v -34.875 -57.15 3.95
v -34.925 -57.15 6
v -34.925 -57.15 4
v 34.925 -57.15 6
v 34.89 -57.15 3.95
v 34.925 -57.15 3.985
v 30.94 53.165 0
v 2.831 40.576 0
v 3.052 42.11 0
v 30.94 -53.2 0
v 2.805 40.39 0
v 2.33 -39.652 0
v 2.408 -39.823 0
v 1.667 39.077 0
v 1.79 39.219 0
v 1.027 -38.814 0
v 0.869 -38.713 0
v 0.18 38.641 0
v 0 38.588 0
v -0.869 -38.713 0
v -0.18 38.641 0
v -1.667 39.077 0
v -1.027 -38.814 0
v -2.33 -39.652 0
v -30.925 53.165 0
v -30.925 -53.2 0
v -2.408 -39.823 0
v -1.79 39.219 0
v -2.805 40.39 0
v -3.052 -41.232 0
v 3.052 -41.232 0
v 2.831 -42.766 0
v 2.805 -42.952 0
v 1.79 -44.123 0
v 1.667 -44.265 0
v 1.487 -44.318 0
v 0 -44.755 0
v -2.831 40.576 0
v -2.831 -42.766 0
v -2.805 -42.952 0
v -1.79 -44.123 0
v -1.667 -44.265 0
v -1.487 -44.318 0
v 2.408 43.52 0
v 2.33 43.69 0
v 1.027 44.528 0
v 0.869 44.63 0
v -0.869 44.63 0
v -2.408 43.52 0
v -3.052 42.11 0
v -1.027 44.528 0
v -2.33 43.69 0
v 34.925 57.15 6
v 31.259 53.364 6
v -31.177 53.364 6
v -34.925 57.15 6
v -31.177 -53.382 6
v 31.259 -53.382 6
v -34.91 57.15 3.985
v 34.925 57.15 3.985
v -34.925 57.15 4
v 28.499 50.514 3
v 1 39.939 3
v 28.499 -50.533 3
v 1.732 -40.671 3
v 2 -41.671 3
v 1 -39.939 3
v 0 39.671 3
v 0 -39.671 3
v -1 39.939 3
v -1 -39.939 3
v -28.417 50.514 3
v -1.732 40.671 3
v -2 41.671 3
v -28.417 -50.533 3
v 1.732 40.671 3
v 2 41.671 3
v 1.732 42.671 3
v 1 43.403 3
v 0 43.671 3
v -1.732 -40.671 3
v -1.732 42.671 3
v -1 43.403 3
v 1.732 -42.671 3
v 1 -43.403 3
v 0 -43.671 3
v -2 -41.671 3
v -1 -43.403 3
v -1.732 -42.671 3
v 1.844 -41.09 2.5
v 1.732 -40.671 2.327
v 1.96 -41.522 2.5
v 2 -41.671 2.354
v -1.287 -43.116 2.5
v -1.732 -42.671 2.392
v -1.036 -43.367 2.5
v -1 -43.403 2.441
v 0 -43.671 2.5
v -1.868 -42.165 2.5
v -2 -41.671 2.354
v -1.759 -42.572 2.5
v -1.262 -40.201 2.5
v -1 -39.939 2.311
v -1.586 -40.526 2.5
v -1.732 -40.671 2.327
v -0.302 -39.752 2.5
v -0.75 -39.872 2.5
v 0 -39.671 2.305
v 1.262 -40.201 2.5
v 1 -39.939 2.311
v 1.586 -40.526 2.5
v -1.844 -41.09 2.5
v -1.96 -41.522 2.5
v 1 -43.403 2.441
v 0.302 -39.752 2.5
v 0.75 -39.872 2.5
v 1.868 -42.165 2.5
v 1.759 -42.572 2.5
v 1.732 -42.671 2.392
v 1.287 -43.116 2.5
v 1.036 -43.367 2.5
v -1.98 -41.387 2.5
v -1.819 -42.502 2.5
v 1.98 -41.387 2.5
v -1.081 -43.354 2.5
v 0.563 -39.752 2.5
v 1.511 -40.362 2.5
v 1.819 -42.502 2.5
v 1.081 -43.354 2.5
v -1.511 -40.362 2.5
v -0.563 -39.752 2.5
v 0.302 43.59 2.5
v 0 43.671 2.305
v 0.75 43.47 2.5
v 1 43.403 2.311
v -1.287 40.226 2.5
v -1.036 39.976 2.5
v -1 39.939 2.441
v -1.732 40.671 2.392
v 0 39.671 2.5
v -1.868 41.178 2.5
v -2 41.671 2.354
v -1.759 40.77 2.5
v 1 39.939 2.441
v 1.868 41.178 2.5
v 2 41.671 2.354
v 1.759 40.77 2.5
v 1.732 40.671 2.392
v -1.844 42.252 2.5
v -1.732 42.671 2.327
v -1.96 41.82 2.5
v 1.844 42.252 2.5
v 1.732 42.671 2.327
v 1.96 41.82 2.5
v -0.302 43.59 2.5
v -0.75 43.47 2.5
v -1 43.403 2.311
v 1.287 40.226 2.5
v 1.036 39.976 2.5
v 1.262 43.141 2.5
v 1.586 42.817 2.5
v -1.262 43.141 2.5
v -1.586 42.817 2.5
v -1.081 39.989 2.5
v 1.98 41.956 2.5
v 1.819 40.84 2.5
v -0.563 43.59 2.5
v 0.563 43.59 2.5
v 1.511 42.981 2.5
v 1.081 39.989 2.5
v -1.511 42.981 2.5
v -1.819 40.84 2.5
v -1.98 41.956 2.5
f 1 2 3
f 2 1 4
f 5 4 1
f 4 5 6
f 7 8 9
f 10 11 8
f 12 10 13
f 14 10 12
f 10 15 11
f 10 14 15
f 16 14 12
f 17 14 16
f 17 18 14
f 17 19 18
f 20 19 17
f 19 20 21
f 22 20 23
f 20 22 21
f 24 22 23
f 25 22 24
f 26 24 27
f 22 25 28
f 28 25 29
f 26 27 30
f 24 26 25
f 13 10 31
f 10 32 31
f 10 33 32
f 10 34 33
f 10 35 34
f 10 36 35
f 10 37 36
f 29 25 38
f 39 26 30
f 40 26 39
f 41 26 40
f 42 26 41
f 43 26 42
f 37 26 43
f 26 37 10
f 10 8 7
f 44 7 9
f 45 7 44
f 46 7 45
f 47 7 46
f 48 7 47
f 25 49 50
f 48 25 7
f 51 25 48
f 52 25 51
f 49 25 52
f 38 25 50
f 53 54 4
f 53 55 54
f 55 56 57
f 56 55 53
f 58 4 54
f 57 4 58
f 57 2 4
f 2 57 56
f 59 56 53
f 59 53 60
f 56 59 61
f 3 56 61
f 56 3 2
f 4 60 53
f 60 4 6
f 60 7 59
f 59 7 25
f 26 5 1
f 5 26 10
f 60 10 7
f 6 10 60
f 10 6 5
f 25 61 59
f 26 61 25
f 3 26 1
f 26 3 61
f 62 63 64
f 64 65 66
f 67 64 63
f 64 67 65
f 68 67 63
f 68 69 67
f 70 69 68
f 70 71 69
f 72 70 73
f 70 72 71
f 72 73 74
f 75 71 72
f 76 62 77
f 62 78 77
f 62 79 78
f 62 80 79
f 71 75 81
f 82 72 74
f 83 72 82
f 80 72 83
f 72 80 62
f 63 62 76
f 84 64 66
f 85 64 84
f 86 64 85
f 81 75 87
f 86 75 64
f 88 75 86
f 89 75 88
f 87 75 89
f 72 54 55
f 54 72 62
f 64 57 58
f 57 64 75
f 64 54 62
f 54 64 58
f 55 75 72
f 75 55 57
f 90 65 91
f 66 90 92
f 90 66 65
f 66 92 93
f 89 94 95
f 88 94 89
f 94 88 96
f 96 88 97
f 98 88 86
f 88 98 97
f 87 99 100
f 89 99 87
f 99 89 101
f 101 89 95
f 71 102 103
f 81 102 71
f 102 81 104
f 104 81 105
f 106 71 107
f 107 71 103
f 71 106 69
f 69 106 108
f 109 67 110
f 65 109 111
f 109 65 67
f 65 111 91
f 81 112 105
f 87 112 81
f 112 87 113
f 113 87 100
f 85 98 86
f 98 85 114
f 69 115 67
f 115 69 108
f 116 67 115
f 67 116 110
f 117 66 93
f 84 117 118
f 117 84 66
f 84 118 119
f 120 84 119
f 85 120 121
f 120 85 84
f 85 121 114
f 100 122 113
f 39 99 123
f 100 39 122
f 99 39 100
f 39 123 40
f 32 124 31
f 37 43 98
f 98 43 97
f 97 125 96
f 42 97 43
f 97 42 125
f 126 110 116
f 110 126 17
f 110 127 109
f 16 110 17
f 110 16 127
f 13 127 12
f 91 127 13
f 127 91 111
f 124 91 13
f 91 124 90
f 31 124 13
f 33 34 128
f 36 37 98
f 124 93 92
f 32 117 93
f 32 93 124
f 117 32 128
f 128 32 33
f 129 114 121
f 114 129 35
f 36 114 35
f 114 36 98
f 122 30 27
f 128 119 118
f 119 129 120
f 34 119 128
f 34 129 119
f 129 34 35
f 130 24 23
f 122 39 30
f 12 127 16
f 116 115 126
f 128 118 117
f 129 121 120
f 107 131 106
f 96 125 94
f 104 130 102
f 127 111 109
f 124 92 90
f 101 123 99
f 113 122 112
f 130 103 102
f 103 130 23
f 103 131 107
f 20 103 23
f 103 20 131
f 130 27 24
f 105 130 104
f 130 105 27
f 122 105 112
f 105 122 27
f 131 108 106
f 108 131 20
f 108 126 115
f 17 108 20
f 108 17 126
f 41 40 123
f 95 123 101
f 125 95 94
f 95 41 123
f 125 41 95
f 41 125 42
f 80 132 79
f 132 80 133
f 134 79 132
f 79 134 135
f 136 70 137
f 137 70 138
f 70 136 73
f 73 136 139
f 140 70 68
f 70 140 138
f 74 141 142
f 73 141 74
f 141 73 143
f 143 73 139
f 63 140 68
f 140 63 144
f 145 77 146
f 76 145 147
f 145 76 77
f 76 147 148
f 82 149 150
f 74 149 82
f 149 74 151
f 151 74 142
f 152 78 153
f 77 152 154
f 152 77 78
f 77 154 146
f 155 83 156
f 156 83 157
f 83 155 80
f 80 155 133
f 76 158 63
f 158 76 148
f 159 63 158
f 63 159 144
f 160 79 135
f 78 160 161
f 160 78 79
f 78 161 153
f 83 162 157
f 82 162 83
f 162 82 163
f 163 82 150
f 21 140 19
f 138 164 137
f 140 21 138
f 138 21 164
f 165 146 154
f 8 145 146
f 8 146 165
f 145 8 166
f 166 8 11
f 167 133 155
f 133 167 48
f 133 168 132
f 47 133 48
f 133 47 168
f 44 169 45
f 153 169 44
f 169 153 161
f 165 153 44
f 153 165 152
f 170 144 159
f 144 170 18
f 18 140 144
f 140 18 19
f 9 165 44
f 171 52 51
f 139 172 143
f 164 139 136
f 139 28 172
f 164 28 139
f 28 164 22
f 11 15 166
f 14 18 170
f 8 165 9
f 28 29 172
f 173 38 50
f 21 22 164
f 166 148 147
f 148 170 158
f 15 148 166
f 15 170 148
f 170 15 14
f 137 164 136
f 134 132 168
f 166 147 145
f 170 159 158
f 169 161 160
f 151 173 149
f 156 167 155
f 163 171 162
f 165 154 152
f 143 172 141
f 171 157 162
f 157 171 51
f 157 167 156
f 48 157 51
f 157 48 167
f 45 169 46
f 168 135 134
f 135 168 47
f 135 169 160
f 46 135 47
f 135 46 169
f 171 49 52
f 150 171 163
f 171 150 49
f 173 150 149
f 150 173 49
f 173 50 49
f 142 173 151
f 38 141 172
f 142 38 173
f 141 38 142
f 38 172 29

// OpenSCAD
// WALLY - Wall Plate Customizer v1.3
// by TheNewHobbyist 2013 (http://thenewhobbyist.com)
// http://www.thingiverse.com/thing:47956
//
// Most of the connectors used with this thing are panel mount connectors from
// www.DataPro.net I can't vouch for their quality but they did have easy to
// find dimensions for their products so I used them.
//
// This could be tightened up considerably but I thought I'd get it out there for people
// to experiment with before I lose my mind staring at it too long. Also this is my
// first OpenSCAD model so cut me some slack ;)
//
//   Notes:
//
// * The plug types "Duplex Outlet", "Long_Toggle Switch", "Toggle Switch", "Rocker", "Triple
//   Keystone Jack - Verticle", and "6 Keystone Jacks" will all use the entire plate when
//   selected in top or bottom configuration. The other selection (if not "none") will be 
//   selected.
//
// * "None" and "Blank should not be considered equal. if "None" is selected for one of
//   the two holes on a plate the other selection will be centered on that plate. If
//   "Blank" is selected that plug location will remain blank but the other selection
//   will NOT move into a centered position.
//
//	Change Log:
//
//	v1.1
//	UPDATED: Screw hole locations for designer and toggle plate types.
//	UPDATED: Hole size for designer plate type.
//	UPDATED: Outlet hole spacing
//
//	v1.2
//	ADDED: Long Toggle Switch for laird
//
//	v1.3
//	ADDED: 3 new sizes for plate export: Standard, Junior-Jumbo, and Jumbo.
//
//  v1.4
//  ADDED: Multiple different layouts for keystone jack: 2x1, 1x3, and 2x3.
//  CHANGED: Single keystone jack generation.
//  Code changes found in v1.4 were implemented by mcflie1994. Some code provided by
//      jsadusk from http://www.thingiverse.com/thing:6647.

  //////////////////////////
 // Customizer Settings: //
//////////////////////////

//How big are we talkin' here?
plate_width = 1; //	[1:5]

// Bigger hole in your wall? Try this
plate_size = 0; // [0:Standard, 1:Junior-Jumbo, 2:Jumbo]

//Pick a plug or full plate type
1st_plate = "none";  //	["none":None, "blank":Blank Port, "toggle":Full Plate - Toggle Switch, "long_toggle":Full Plate - Long Toggle Switch, "outlet":Full Plate - Duplex Outlet, "rocker":Full Plate - Rocker/Designer Plate, "keystone_1x3":Full Plate - Triple Keystone Jack - Verticle, "keystone_2x3":Full Plate - 6 Keystone Jacks, "keystone_1x1":Single Keystone Jack, "keystone_2x1":Double Keystone Jack, "vga":VGA Port, "hdmi":HDMI Port, "dvi":DVI-I Port, "displayport":Displayport, "cat5e":Cat5e/Cat6 Port, "usb-a":USB-A Port, "usb-b":USB-B Port, "firewire":Firewire IEEE 1394 Port, "db09":DB-09 Port, "ps2":PS2 Port, "f-type": F-Type/Coaxial Port,"svideo":S-Video Port, "stereo":Stereo Headphone Jack]
//Pick a bottom plug type or leave as none
1st_plate_bottom_hole = "none";  //	["none":None, "blank":Blank Port, "keystone_1x1":Single Keystone Jack, "keystone_2x1":Double Keystone Jack, "vga":VGA Port, "hdmi":HDMI Port, "dvi":DVI-I Port, "displayport":Displayport, "cat5e":Cat5e/Cat6 Port, "usb-a":USB-A Port, "usb-b":USB-B Port, "firewire":Firewire IEEE 1394 Port, "db09":DB-09 Port, "ps2":PS2 Port, "f-type": F-Type/Coaxial Port,"svideo":S-Video Port, "stereo":Stereo Headphone Jack]
//Pick a plug or full plate type
2nd_plate = "none";  //	["none":None, "blank":Blank Port, "toggle":Full Plate - Toggle Switch, "long_toggle":Full Plate - Long Toggle Switch, "outlet":Full Plate - Duplex Outlet, "rocker":Full Plate - Rocker/Designer Plate, "keystone_1x3":Full Plate - Triple Keystone Jack - Verticle, "keystone_2x3":Full Plate - 6 Keystone Jacks, "keystone_1x1":Single Keystone Jack, "keystone_2x1":Double Keystone Jack, "vga":VGA Port, "hdmi":HDMI Port, "dvi":DVI-I Port, "displayport":Displayport, "cat5e":Cat5e/Cat6 Port, "usb-a":USB-A Port, "usb-b":USB-B Port, "firewire":Firewire IEEE 1394 Port, "db09":DB-09 Port, "ps2":PS2 Port, "f-type": F-Type/Coaxial Port,"svideo":S-Video Port, "stereo":Stereo Headphone Jack]
//Pick a bottom plug type or leave as none
2nd_plate_bottom_hole = "none";  //	["none":None, "blank":Blank Port, "keystone_1x1":Single Keystone Jack, "keystone_2x1":Double Keystone Jack, "vga":VGA Port, "hdmi":HDMI Port, "dvi":DVI-I Port, "displayport":Displayport, "cat5e":Cat5e/Cat6 Port, "usb-a":USB-A Port, "usb-b":USB-B Port, "firewire":Firewire IEEE 1394 Port, "db09":DB-09 Port, "ps2":PS2 Port, "f-type": F-Type/Coaxial Port,"svideo":S-Video Port, "stereo":Stereo Headphone Jack]
//Pick a plug or full plate type
3rd_plate = "none";  //	["none":None, "blank":Blank Port, "toggle":Full Plate - Toggle Switch, "long_toggle":Full Plate - Long Toggle Switch, "outlet":Full Plate - Duplex Outlet, "rocker":Full Plate - Rocker/Designer Plate, "keystone_1x3":Full Plate - Triple Keystone Jack - Verticle, "keystone_2x3":Full Plate - 6 Keystone Jacks, "keystone_1x1":Single Keystone Jack, "keystone_2x1":Double Keystone Jack, "vga":VGA Port, "hdmi":HDMI Port, "dvi":DVI-I Port, "displayport":Displayport, "cat5e":Cat5e/Cat6 Port, "usb-a":USB-A Port, "usb-b":USB-B Port, "firewire":Firewire IEEE 1394 Port, "db09":DB-09 Port, "ps2":PS2 Port, "f-type": F-Type/Coaxial Port,"svideo":S-Video Port, "stereo":Stereo Headphone Jack]
//Pick a bottom plug type or leave as none
3rd_plate_bottom_hole = "none";  //	["none":None, "blank":Blank Port, "keystone_1x1":Single Keystone Jack, "keystone_2x1":Double Keystone Jack, "vga":VGA Port, "hdmi":HDMI Port, "dvi":DVI-I Port, "displayport":Displayport, "cat5e":Cat5e/Cat6 Port, "usb-a":USB-A Port, "usb-b":USB-B Port, "firewire":Firewire IEEE 1394 Port, "db09":DB-09 Port, "ps2":PS2 Port, "f-type": F-Type/Coaxial Port,"svideo":S-Video Port, "stereo":Stereo Headphone Jack]
//Pick a plug or full plate type
4th_plate = "none";  //	["none":None, "blank":Blank Port, "toggle":Full Plate - Toggle Switch, "long_toggle":Full Plate - Long Toggle Switch, "outlet":Full Plate - Duplex Outlet, "rocker":Full Plate - Rocker/Designer Plate, "keystone_1x3":Full Plate - Triple Keystone Jack - Verticle, "keystone_2x3":Full Plate - 6 Keystone Jacks, "keystone_1x1":Single Keystone Jack, "keystone_2x1":Double Keystone Jack, "vga":VGA Port, "hdmi":HDMI Port, "dvi":DVI-I Port, "displayport":Displayport, "cat5e":Cat5e/Cat6 Port, "usb-a":USB-A Port, "usb-b":USB-B Port, "firewire":Firewire IEEE 1394 Port, "db09":DB-09 Port, "ps2":PS2 Port, "f-type": F-Type/Coaxial Port,"svideo":S-Video Port, "stereo":Stereo Headphone Jack]
//Pick a bottom plug type or leave as none
4th_plate_bottom_hole = "none";  //	["none":None, "blank":Blank Port, "keystone_1x1":Single Keystone Jack, "keystone_2x1":Double Keystone Jack, "vga":VGA Port, "hdmi":HDMI Port, "dvi":DVI-I Port, "displayport":Displayport, "cat5e":Cat5e/Cat6 Port, "usb-a":USB-A Port, "usb-b":USB-B Port, "firewire":Firewire IEEE 1394 Port, "db09":DB-09 Port, "ps2":PS2 Port, "f-type": F-Type/Coaxial Port,"svideo":S-Video Port, "stereo":Stereo Headphone Jack]
//Pick a plug or full plate type
5th_plate = "none";  //	["none":None, "blank":Blank Port, "toggle":Full Plate - Toggle Switch, "long_toggle":Full Plate - Long Toggle Switch, "outlet":Full Plate - Duplex Outlet, "rocker":Full Plate - Rocker/Designer Plate, "keystone_1x3":Full Plate - Triple Keystone Jack - Verticle, "keystone_2x3":Full Plate - 6 Keystone Jacks, "keystone_1x1":Single Keystone Jack, "keystone_2x1":Double Keystone Jack, "vga":VGA Port, "hdmi":HDMI Port, "dvi":DVI-I Port, "displayport":Displayport, "cat5e":Cat5e/Cat6 Port, "usb-a":USB-A Port, "usb-b":USB-B Port, "firewire":Firewire IEEE 1394 Port, "db09":DB-09 Port, "ps2":PS2 Port, "f-type": F-Type/Coaxial Port,"svideo":S-Video Port, "stereo":Stereo Headphone Jack]
//Pick a bottom plug type or leave as none
5th_plate_bottom_hole = "none";  //	["none":None, "blank":Blank Port, "keystone_1x1":Single Keystone Jack, "keystone_2x1":Double Keystone Jack, "vga":VGA Port, "hdmi":HDMI Port, "dvi":DVI-I Port, "displayport":Displayport, "cat5e":Cat5e/Cat6 Port, "usb-a":USB-A Port, "usb-b":USB-B Port, "firewire":Firewire IEEE 1394 Port, "db09":DB-09 Port, "ps2":PS2 Port, "f-type": F-Type/Coaxial Port,"svideo":S-Video Port, "stereo":Stereo Headphone Jack]

  //////////////////////
 // Static Settings: //
//////////////////////

module GoAwayCustomizer() {
// This module is here to stop Customizer from picking up the variables below
}

l_offset = [34.925,39.6875,44.45];
r_offset = [34.925,39.6875,44.45];
spacer = [0,0,46.0375,92.075,138.1125,184.15];
solid_plate_width = l_offset[plate_size] + spacer[plate_width] + r_offset[plate_size];

height_sizes = [114.3,123.825,133.35];

height = 114.3; //plate height (static)
gang_width=[0,69.86,115.824,161.925,206.375,254]; // Plate widths (standard)

edgewidth = solid_plate_width + 10; // Bevel setting for top and bottom
rightbevel = solid_plate_width - 4; // Bevel for right side (scales)

left_offset = 34.925; // Offset first hole position
switch_offset = 46.0375; // Offset all additional holes
thinner_offset=[0,0.92,0.95,0.96,0.97,0.973]; // Manual fix for right side wackiness

positions=[height_sizes[plate_size]/2,height_sizes[plate_size]/2 - 14.25,height_sizes[plate_size]/2 + 14.25];

  ///////////////////////////
 // Keystone Solids Vars: //
///////////////////////////

jack_length =16.5;
jack_width = 15;

wall_height = 10;
wall_thickness = 2;

catch_overhang = 2;

small_clip_depth = catch_overhang;
big_clip_depth = catch_overhang + 2;
big_clip_clearance = 4;
small_clip_clearance = 6.5;

outer_length = jack_length + small_clip_depth + big_clip_depth +
                            (wall_thickness * 2);
outer_width = jack_width + (wall_thickness * 2);

// preview[view:north, tilt:bottom]

  ///////////////////
 // Hole Control: //
///////////////////

module plate1(){
	if (1st_plate == "toggle" || 1st_plate_bottom_hole == "toggle"){
		translate([0,l_offset[plate_size],0]) toggle_screws();
		translate([0,l_offset[plate_size],0]) hole("toggle");
		}
	else if (1st_plate == "long_toggle" || 1st_plate_bottom_hole == "long_toggle"){
		translate([0,l_offset[plate_size],0]) toggle_screws();
		translate([0,l_offset[plate_size],0]) hole("long_toggle");
		}
	else if (1st_plate == "rocker" || 1st_plate_bottom_hole == "rocker"){
		translate([0,l_offset[plate_size],0]) rocker_screws();
		translate([0,l_offset[plate_size],0]) hole("rocker");
		}
	else if (1st_plate == "outlet" || 1st_plate_bottom_hole == "outlet") {
        translate([0,l_offset[plate_size],0]) hole("outlet");
        }
    else if (1st_plate == "keystone_1x3" || 1st_plate_bottom_hole == "keystone_1x3"){
		translate([0,l_offset[plate_size],0]) box_screws();
		translate([0,l_offset[plate_size],0]) hole("keystone_1x3");
		}
    else if (1st_plate == "keystone_2x3" || 1st_plate_bottom_hole == "keystone_2x3"){
		translate([0,l_offset[plate_size],0]) box_screws();
		translate([0,l_offset[plate_size],0]) hole("keystone_2x3");
		}
    else if (1st_plate_bottom_hole == "none") {
		translate([0,l_offset[plate_size],0]) box_screws();
		translate([positions[0],l_offset[plate_size],0]) hole(1st_plate);
			}
	else if (1st_plate == "none") {
		translate([0,l_offset[plate_size],0]) box_screws();
		translate([positions[0],l_offset[plate_size],0]) hole(1st_plate_bottom_hole);
			}
	else {
	translate([0,l_offset[plate_size],0]) box_screws();
	translate([positions[1],l_offset[plate_size],0]) hole(1st_plate);
	translate([positions[2],l_offset[plate_size],0]) hole(1st_plate_bottom_hole);
	}
}

module plate2(){
	if (2nd_plate == "toggle" || 2nd_plate_bottom_hole == "toggle"){
		translate([0,l_offset[plate_size] + switch_offset,0]) toggle_screws();
		translate([0,l_offset[plate_size] + switch_offset,0]) hole("toggle");
		}
	else if (2nd_plate == "long_toggle" || 2nd_plate_bottom_hole == "long_toggle"){
		translate([0,l_offset[plate_size] + switch_offset,0]) toggle_screws();
		translate([0,l_offset[plate_size] + switch_offset,0]) hole("long_toggle");
		}
	else if (2nd_plate == "rocker" || 2nd_plate_bottom_hole == "rocker"){
		translate([0,l_offset[plate_size] + switch_offset,0]) rocker_screws();
		translate([0,l_offset[plate_size] + switch_offset,0]) hole("rocker");
		}
	else if (2nd_plate == "outlet" || 2nd_plate_bottom_hole == "outlet") {
        translate([0,l_offset[plate_size] + switch_offset,0]) hole("outlet");
        }
    else if (2nd_plate == "keystone_1x3" || 2nd_plate_bottom_hole == "keystone_1x3"){
		translate([0,l_offset[plate_size] + switch_offset,0]) box_screws();
		translate([0,l_offset[plate_size] + switch_offset,0]) hole("keystone_1x3");
		}
    else if (2nd_plate == "keystone_2x3" || 2nd_plate_bottom_hole == "keystone_2x3"){
		translate([0,l_offset[plate_size] + switch_offset,0]) box_screws();
		translate([0,l_offset[plate_size] + switch_offset,0]) hole("keystone_2x3");
		}
	else if (2nd_plate_bottom_hole == "none") {
		translate([0,l_offset[plate_size] + switch_offset,0]) box_screws();
		translate([positions[0],l_offset[plate_size] + switch_offset,0]) hole(2nd_plate);
			}
	else if (2nd_plate == "none") {
		translate([0,l_offset[plate_size] + switch_offset,0]) box_screws();
		translate([positions[0],l_offset[plate_size] + switch_offset,0]) hole(2nd_plate_bottom_hole);
			}
	else {
	translate([0,l_offset[plate_size] + switch_offset,0]) box_screws();
	translate([positions[1],l_offset[plate_size] + switch_offset,0]) hole(2nd_plate);
	translate([positions[2],l_offset[plate_size] + switch_offset,0]) hole(2nd_plate_bottom_hole);
	}
}

module plate3(){
	if (3rd_plate == "toggle" || 3rd_plate_bottom_hole == "toggle"){
		translate([0,l_offset[plate_size] + switch_offset * 2,0]) toggle_screws();
		translate([0,l_offset[plate_size] + switch_offset * 2,0]) hole("toggle");
		}
	else if (3rd_plate == "long_toggle" || 3rd_plate_bottom_hole == "long_toggle"){
		translate([0,l_offset[plate_size] + switch_offset * 2,0]) toggle_screws();
		translate([0,l_offset[plate_size] + switch_offset * 2,0]) hole("long_toggle");
		}
	else if (3rd_plate == "rocker" || 3rd_plate_bottom_hole == "rocker"){
		translate([0,l_offset[plate_size] + switch_offset * 2,0]) rocker_screws();
		translate([0,l_offset[plate_size] + switch_offset * 2,0]) hole("rocker");
		}
	else if (3rd_plate == "outlet" || 3rd_plate_bottom_hole == "outlet") {
        translate([0,l_offset[plate_size] + switch_offset * 2,0]) hole("outlet");
        }
    else if (3rd_plate == "keystone_1x3" || 3rd_plate_bottom_hole == "keystone_1x3"){
		translate([0,l_offset[plate_size] + switch_offset * 2,0]) box_screws();
		translate([0,l_offset[plate_size] + switch_offset * 2,0]) hole("keystone_1x3");
		}
    else if (3rd_plate == "keystone_2x3" || 3rd_plate_bottom_hole == "keystone_2x3"){
		translate([0,l_offset[plate_size] + switch_offset * 2,0]) box_screws();
		translate([0,l_offset[plate_size] + switch_offset * 2,0]) hole("keystone_2x3");
		}
	else if (3rd_plate_bottom_hole == "none") {
		translate([0,l_offset[plate_size] + switch_offset * 2,0]) box_screws();
		translate([positions[0],l_offset[plate_size] + switch_offset * 2,0]) hole(3rd_plate);
			}
	else if (3rd_plate == "none") {
		translate([0,l_offset[plate_size] + switch_offset * 2,0]) box_screws();
		translate([positions[0],l_offset[plate_size] + switch_offset * 2,0]) hole(3rd_plate_bottom_hole);
			}
	else {
	translate([0,l_offset[plate_size] + switch_offset * 2,0]) box_screws();
	translate([positions[1],l_offset[plate_size] + switch_offset * 2,0]) hole(3rd_plate);
	translate([positions[2],l_offset[plate_size] + switch_offset * 2,0]) hole(3rd_plate_bottom_hole);
	}
}

module plate4(){
	if (4th_plate == "toggle" || 4th_plate_bottom_hole == "toggle"){
		translate([0,l_offset[plate_size] + switch_offset * 3,0]) toggle_screws();
		translate([0,l_offset[plate_size] + switch_offset * 3,0]) hole("toggle");
		}
	else if (4th_plate == "long_toggle" || 4th_plate_bottom_hole == "long_toggle"){
		translate([0,l_offset[plate_size] + switch_offset * 3,0]) toggle_screws();
		translate([0,l_offset[plate_size] + switch_offset * 3,0]) hole("long_toggle");
		}
	else if (4th_plate == "rocker" || 4th_plate_bottom_hole == "rocker"){
		translate([0,l_offset[plate_size] + switch_offset * 3,0]) rocker_screws();
		translate([0,l_offset[plate_size] + switch_offset * 3,0]) hole("rocker");
		}
	else if (4th_plate == "outlet" || 4th_plate_bottom_hole == "outlet") {
        translate([0,l_offset[plate_size] + switch_offset * 3,0]) hole("outlet");
        }
    else if (4th_plate == "keystone_1x3" || 4th_plate_bottom_hole == "keystone_1x3"){
		translate([0,l_offset[plate_size] + switch_offset * 3,0]) box_screws();
		translate([0,l_offset[plate_size] + switch_offset * 3,0]) hole("keystone_1x3");
		}
    else if (4th_plate == "keystone_2x3" || 4th_plate_bottom_hole == "keystone_2x3"){
		translate([0,l_offset[plate_size] + switch_offset * 3,0]) box_screws();
		translate([0,l_offset[plate_size] + switch_offset * 3,0]) hole("keystone_2x3");
		}
	else if (4th_plate_bottom_hole == "none") {
		translate([0,l_offset[plate_size] + switch_offset * 3,0]) box_screws();
		translate([positions[0],l_offset[plate_size] + switch_offset * 3,0]) hole(4th_plate);
			}
	else if (4th_plate == "none") {
		translate([0,l_offset[plate_size] + switch_offset * 3,0]) box_screws();
		translate([positions[0],l_offset[plate_size] + switch_offset * 3,0]) hole(4th_plate_bottom_hole);
			}
	else {
	translate([0,l_offset[plate_size] + switch_offset * 3,0]) box_screws();
	translate([positions[1],l_offset[plate_size] + switch_offset * 3,0]) hole(4th_plate);
	translate([positions[2],l_offset[plate_size] + switch_offset * 3,0]) hole(4th_plate_bottom_hole);
	}
}

module plate5(){
	if (5th_plate == "toggle" || 5th_plate_bottom_hole == "toggle"){
		translate([0,l_offset[plate_size] + switch_offset * 4,0]) toggle_screws();
		translate([0,l_offset[plate_size] + switch_offset * 4,0]) hole("toggle");
		}
	else if (5th_plate == "long_toggle" || 5th_plate_bottom_hole == "long_toggle"){
		translate([0,l_offset[plate_size] + switch_offset * 4,0]) toggle_screws();
		translate([0,l_offset[plate_size] + switch_offset * 4,0]) hole("long_toggle");
		}
	else if (5th_plate == "rocker" || 5th_plate_bottom_hole == "rocker"){
		translate([0,l_offset[plate_size] + switch_offset * 4,0]) rocker_screws();
		translate([0,l_offset[plate_size] + switch_offset * 4,0]) hole("rocker");
		}
	else if (5th_plate == "outlet" || 5th_plate_bottom_hole == "outlet") {
        translate([0,l_offset[plate_size] + switch_offset * 4,0]) hole("outlet");
        }
    else if (5th_plate == "keystone_1x3" || 5th_plate_bottom_hole == "keystone_1x3"){
		translate([0,l_offset[plate_size] + switch_offset * 4,0]) box_screws();
		translate([0,l_offset[plate_size] + switch_offset * 4,0]) hole("keystone_1x3");
		}
    else if (5th_plate == "keystone_2x3" || 5th_plate_bottom_hole == "keystone_2x3"){
		translate([0,l_offset[plate_size] + switch_offset * 4,0]) box_screws();
		translate([0,l_offset[plate_size] + switch_offset * 4,0]) hole("keystone_2x3");
		}
	else if (5th_plate_bottom_hole == "none") {
		translate([0,l_offset[plate_size] + switch_offset * 4,0]) box_screws();
		translate([positions[0],l_offset[plate_size] + switch_offset * 4,0]) hole(5th_plate);
			}
	else if (5th_plate == "none") {
		translate([0,l_offset[plate_size] + switch_offset * 4,0]) box_screws();
		translate([positions[0],l_offset[plate_size] + switch_offset * 4,0]) hole(5th_plate_bottom_hole);
			}
	else {
	translate([0,l_offset[plate_size] + switch_offset * 4,0]) box_screws();
	translate([positions[1],l_offset[plate_size] + switch_offset * 4,0]) hole(5th_plate);
	translate([positions[2],l_offset[plate_size] + switch_offset * 4,0]) hole(5th_plate_bottom_hole);
	}
}

  /////////////////
 // SolidWorks: //
/////////////////

module plate1_solid(){

if (1st_plate == "keystone_1x1" && 1st_plate_bottom_hole == "none") {
	translate([height_sizes[plate_size]/2 + outer_length/2,l_offset[plate_size] - 22,6]) rotate([0,180,0]) keystone_matrix_generator(1);
	}
else if (1st_plate == "keystone_1x1" && 1st_plate_bottom_hole != "outlet" && 1st_plate_bottom_hole != "toggle" && 1st_plate_bottom_hole != "rocker" && 1st_plate_bottom_hole != "keystone_1x3" && 1st_plate_bottom_hole != "keystone_2x3") {
	translate([height_sizes[plate_size]/2 - 1,l_offset[plate_size] - 22,6]) rotate([0,180,0])  keystone_matrix_generator(1);
	}
if (1st_plate_bottom_hole == "keystone_1x1" && 1st_plate == "none") {
	translate([height_sizes[plate_size]/2 + outer_length/2,l_offset[plate_size] - 22,6]) rotate([0,180,0]) keystone_matrix_generator(1);
	}
else if (1st_plate_bottom_hole == "keystone_1x1" && 1st_plate != "outlet" && 1st_plate != "toggle" && 1st_plate != "rocker" && 1st_plate != "keystone_1x3" && 1st_plate != "keystone_2x3") {
	translate([height_sizes[plate_size]/2 + outer_length + 1,l_offset[plate_size] - 22,6]) rotate([0,180,0]) keystone_matrix_generator(1);
	}
if (1st_plate == "keystone_2x1" && 1st_plate_bottom_hole == "none") {
	translate([height_sizes[plate_size]/2 + outer_length/2,l_offset[plate_size] - 22,6]) rotate([0,180,0]) keystone_matrix_generator(2);
	}
else if (1st_plate == "keystone_2x1" && 1st_plate_bottom_hole != "outlet" && 1st_plate_bottom_hole != "toggle" && 1st_plate_bottom_hole != "rocker" && 1st_plate_bottom_hole != "keystone_1x3" && 1st_plate_bottom_hole != "keystone_2x3") {
	translate([height_sizes[plate_size]/2 - 1,l_offset[plate_size] - 22,6]) rotate([0,180,0])  keystone_matrix_generator(2);
	}
if (1st_plate_bottom_hole == "keystone_2x1" && 1st_plate == "none") {
	translate([height_sizes[plate_size]/2 + outer_length/2,l_offset[plate_size] - 22,6]) rotate([0,180,0]) keystone_matrix_generator(2);
	}
else if (1st_plate_bottom_hole == "keystone_2x1" && 1st_plate != "outlet" && 1st_plate != "toggle" && 1st_plate != "rocker" && 1st_plate != "keystone_1x3" && 1st_plate != "keystone_2x3") {
	translate([height_sizes[plate_size]/2 + outer_length + 1,l_offset[plate_size] - 22,6]) rotate([0,180,0]) keystone_matrix_generator(2);
	}
if (1st_plate == "keystone_1x3" && 1st_plate_bottom_hole != "outlet" && 1st_plate_bottom_hole != "toggle" && 1st_plate_bottom_hole != "rocker" && 1st_plate_bottom_hole != "keystone_2x3") {
	translate([height_sizes[plate_size]/2 +  75.5/2,l_offset[plate_size] - 22,6]) rotate([0,180,0]) keystone_matrix_generator(3);
	}
else if (1st_plate_bottom_hole == "keystone_1x3" && 1st_plate != "outlet" && 1st_plate != "toggle" && 1st_plate != "rocker" && 1st_plate != "keystone_2x3") {
	translate([height_sizes[plate_size]/2 +  75.5/2,l_offset[plate_size] - 22,6]) rotate([0,180,0]) keystone_matrix_generator(3);
	}
if (1st_plate == "keystone_2x3" && 1st_plate_bottom_hole != "outlet" && 1st_plate_bottom_hole != "toggle" && 1st_plate_bottom_hole != "rocker") {
	translate([height_sizes[plate_size]/2 +  75.5/2,l_offset[plate_size] - 22,6]) rotate([0,180,0]) keystone_matrix_generator(6);
	}
else if (1st_plate_bottom_hole == "keystone_2x3" && 1st_plate != "outlet" && 1st_plate != "toggle" && 1st_plate != "rocker") {
	translate([height_sizes[plate_size]/2 +  75.5/2,l_offset[plate_size] - 22,6]) rotate([0,180,0]) keystone_matrix_generator(6);
	}
}

module plate2_solid(){
if (2nd_plate == "keystone_1x1" && 2nd_plate_bottom_hole == "none") {
	translate([height_sizes[plate_size]/2 + outer_length/2,l_offset[plate_size] - 22 + switch_offset,6]) rotate([0,180,0]) keystone_matrix_generator(1);
	}
else if (2nd_plate == "keystone_1x1" && 2nd_plate_bottom_hole != "outlet" && 2nd_plate_bottom_hole != "toggle" && 2nd_plate_bottom_hole != "rocker" && 2nd_plate_bottom_hole != "keystone_1x3" && 2nd_plate_bottom_hole != "keystone_2x3") {
	translate([height_sizes[plate_size]/2 - 1,l_offset[plate_size] - 22 + switch_offset,6]) rotate([0,180,0])  keystone_matrix_generator(1);
	}
if (2nd_plate_bottom_hole == "keystone_1x1" && 2nd_plate == "none") {
	translate([height_sizes[plate_size]/2 + outer_length/2,l_offset[plate_size] - 22 + switch_offset,6]) rotate([0,180,0]) keystone_matrix_generator(1);
	}
else if (2nd_plate_bottom_hole == "keystone_1x1" && 2nd_plate != "outlet" && 2nd_plate != "toggle" && 2nd_plate != "rocker" && 2nd_plate != "keystone_1x3" && 2nd_plate != "keystone_2x3") {
	translate([height_sizes[plate_size]/2 + outer_length + 1,l_offset[plate_size] - 22 + switch_offset,6]) rotate([0,180,0]) keystone_matrix_generator(1);
	}
if (2nd_plate == "keystone_2x1" && 2nd_plate_bottom_hole == "none") {
	translate([height_sizes[plate_size]/2 + outer_length/2,l_offset[plate_size] - 22 + switch_offset,6]) rotate([0,180,0]) keystone_matrix_generator(2);
	}
else if (2nd_plate == "keystone_2x1" && 2nd_plate_bottom_hole != "outlet" && 2nd_plate_bottom_hole != "toggle" && 2nd_plate_bottom_hole != "rocker" && 2nd_plate_bottom_hole != "keystone_1x3" && 2nd_plate_bottom_hole != "keystone_2x3") {
	translate([height_sizes[plate_size]/2 - 1,l_offset[plate_size] - 22 + switch_offset,6]) rotate([0,180,0])  keystone_matrix_generator(2);
	}
if (2nd_plate_bottom_hole == "keystone_2x1" && 2nd_plate == "none") {
	translate([height_sizes[plate_size]/2 + outer_length/2,l_offset[plate_size] - 22 + switch_offset,6]) rotate([0,180,0]) keystone_matrix_generator(2);
	}
else if (2nd_plate_bottom_hole == "keystone_2x1" && 2nd_plate != "outlet" && 2nd_plate != "toggle" && 2nd_plate != "rocker" && 2nd_plate != "keystone_1x3" && 2nd_plate != "keystone_2x3") {
	translate([height_sizes[plate_size]/2 + outer_length + 1,l_offset[plate_size] - 22 + switch_offset,6]) rotate([0,180,0]) keystone_matrix_generator(2);
	}
if (2nd_plate == "keystone_1x3" && 2nd_plate_bottom_hole != "outlet" && 2nd_plate_bottom_hole != "toggle" && 2nd_plate_bottom_hole != "rocker" && 2nd_plate_bottom_hole != "keystone_2x3") {
	translate([height_sizes[plate_size]/2 +  75.5/2,l_offset[plate_size] - 22 + switch_offset,6]) rotate([0,180,0]) keystone_matrix_generator(3);
	}
else if (2nd_plate_bottom_hole == "keystone_1x3" && 2nd_plate != "outlet" && 2nd_plate != "toggle" && 2nd_plate != "rocker" && 2nd_plate != "keystone_2x3") {
	translate([height_sizes[plate_size]/2 +  75.5/2,l_offset[plate_size] - 22 + switch_offset,6]) rotate([0,180,0]) keystone_matrix_generator(3);
	}
if (2nd_plate == "keystone_2x3" && 2nd_plate_bottom_hole != "outlet" && 2nd_plate_bottom_hole != "toggle" && 2nd_plate_bottom_hole != "rocker") {
	translate([height_sizes[plate_size]/2 +  75.5/2,l_offset[plate_size] - 22 + switch_offset,6]) rotate([0,180,0]) keystone_matrix_generator(6);
	}
else if (2nd_plate_bottom_hole == "keystone_2x3" && 2nd_plate != "outlet" && 2nd_plate != "toggle" && 2nd_plate != "rocker") {
	translate([height_sizes[plate_size]/2 +  75.5/2,l_offset[plate_size] - 22 + switch_offset,6]) rotate([0,180,0]) keystone_matrix_generator(6);
	}
}

module plate3_solid(){
if (3rd_plate == "keystone_1x1" && 3rd_plate_bottom_hole == "none") {
	translate([height_sizes[plate_size]/2 + outer_length/2,l_offset[plate_size] - 22 + switch_offset * 2,6]) rotate([0,180,0]) keystone_matrix_generator(1);
	}
else if (3rd_plate == "keystone_1x1" && 3rd_plate_bottom_hole != "outlet" && 3rd_plate_bottom_hole != "toggle" && 3rd_plate_bottom_hole != "rocker" && 3rd_plate_bottom_hole != "keystone_1x3" && 3rd_plate_bottom_hole != "keystone_2x3") {
	translate([height_sizes[plate_size]/2 - 1,l_offset[plate_size] - 22 + switch_offset * 2,6]) rotate([0,180,0])  keystone_matrix_generator(1);
	}
if (3rd_plate_bottom_hole == "keystone_1x1" && 3rd_plate == "none") {
	translate([height_sizes[plate_size]/2 + outer_length/2,l_offset[plate_size] - 22 + switch_offset * 2,6]) rotate([0,180,0]) keystone_matrix_generator(1);
	}
else if (3rd_plate_bottom_hole == "keystone_1x1" && 3rd_plate != "outlet" && 3rd_plate != "toggle" && 3rd_plate != "rocker" && 3rd_plate != "keystone_1x3" && 3rd_plate != "keystone_2x3") {
	translate([height_sizes[plate_size]/2 + outer_length + 1,l_offset[plate_size] - 22 + switch_offset * 2,6]) rotate([0,180,0]) keystone_matrix_generator(1);
	}
if (3rd_plate == "keystone_2x1" && 3rd_plate_bottom_hole == "none") {
	translate([height_sizes[plate_size]/2 + outer_length/2,l_offset[plate_size] - 22 + switch_offset * 2,6]) rotate([0,180,0]) keystone_matrix_generator(2);
	}
else if (3rd_plate == "keystone_2x1" && 3rd_plate_bottom_hole != "outlet" && 3rd_plate_bottom_hole != "toggle" && 3rd_plate_bottom_hole != "rocker" && 3rd_plate_bottom_hole != "keystone_1x3" && 3rd_plate_bottom_hole != "keystone_2x3") {
	translate([height_sizes[plate_size]/2 - 1,l_offset[plate_size] - 22 + switch_offset * 2,6]) rotate([0,180,0])  keystone_matrix_generator(2);
	}
if (3rd_plate_bottom_hole == "keystone_2x1" && 3rd_plate == "none") {
	translate([height_sizes[plate_size]/2 + outer_length/2,l_offset[plate_size] - 22 + switch_offset * 2,6]) rotate([0,180,0]) keystone_matrix_generator(2);
	}
else if (3rd_plate_bottom_hole == "keystone_2x1" && 3rd_plate != "outlet" && 3rd_plate != "toggle" && 3rd_plate != "rocker" && 3rd_plate != "keystone_1x3" && 3rd_plate != "keystone_2x3") {
	translate([height_sizes[plate_size]/2 + outer_length + 1,l_offset[plate_size] - 22 + switch_offset * 2,6]) rotate([0,180,0]) keystone_matrix_generator(2);
	}
if (3rd_plate == "keystone_1x3" && 3rd_plate_bottom_hole != "outlet" && 3rd_plate_bottom_hole != "toggle" && 3rd_plate_bottom_hole != "rocker" && 3rd_plate_bottom_hole != "keystone_2x3") {
	translate([height_sizes[plate_size]/2 +  75.5/2,l_offset[plate_size] - 22 + switch_offset * 2,6]) rotate([0,180,0]) keystone_matrix_generator(3);
	}
else if (3rd_plate_bottom_hole == "keystone_1x3" && 3rd_plate != "outlet" && 3rd_plate != "toggle" && 3rd_plate != "rocker" && 3rd_plate != "keystone_2x3") {
	translate([height_sizes[plate_size]/2 +  75.5/2,l_offset[plate_size] - 22 + switch_offset * 2,6]) rotate([0,180,0]) keystone_matrix_generator(3);
	}
if (3rd_plate == "keystone_2x3" && 3rd_plate_bottom_hole != "outlet" && 3rd_plate_bottom_hole != "toggle" && 3rd_plate_bottom_hole != "rocker") {
	translate([height_sizes[plate_size]/2 +  75.5/2,l_offset[plate_size] - 22 + switch_offset * 2,6]) rotate([0,180,0]) keystone_matrix_generator(6);
	}
else if (3rd_plate_bottom_hole == "keystone_2x3" && 3rd_plate != "outlet" && 3rd_plate != "toggle" && 3rd_plate != "rocker") {
	translate([height_sizes[plate_size]/2 +  75.5/2,l_offset[plate_size] - 22 + switch_offset * 2,6]) rotate([0,180,0]) keystone_matrix_generator(6);
	}
}

module plate4_solid(){
if (4th_plate == "keystone_1x1" && 4th_plate_bottom_hole == "none") {
	translate([height_sizes[plate_size]/2 + outer_length/2,l_offset[plate_size] - 22 + switch_offset * 3,6]) rotate([0,180,0]) keystone_matrix_generator(1);
	}
else if (4th_plate == "keystone_1x1" && 4th_plate_bottom_hole != "outlet" && 4th_plate_bottom_hole != "toggle" && 4th_plate_bottom_hole != "rocker" && 4th_plate_bottom_hole != "keystone_1x3" && 4th_plate_bottom_hole != "keystone_2x3") {
	translate([height_sizes[plate_size]/2 - 1,l_offset[plate_size] - 22 + switch_offset * 3,6]) rotate([0,180,0])  keystone_matrix_generator(1);
	}
if (4th_plate_bottom_hole == "keystone_1x1" && 4th_plate == "none") {
	translate([height_sizes[plate_size]/2 + outer_length/2,l_offset[plate_size] - 22 + switch_offset * 3,6]) rotate([0,180,0]) keystone_matrix_generator(1);
	}
else if (4th_plate_bottom_hole == "keystone_1x1" && 4th_plate != "outlet" && 4th_plate != "toggle" && 4th_plate != "rocker" && 4th_plate != "keystone_1x3" && 4th_plate != "keystone_2x3") {
	translate([height_sizes[plate_size]/2 + outer_length + 1,l_offset[plate_size] - 22 + switch_offset * 3,6]) rotate([0,180,0]) keystone_matrix_generator(1);
	}
if (4th_plate == "keystone_2x1" && 4th_plate_bottom_hole == "none") {
	translate([height_sizes[plate_size]/2 + outer_length/2,l_offset[plate_size] - 22 + switch_offset * 3,6]) rotate([0,180,0]) keystone_matrix_generator(2);
	}
else if (4th_plate == "keystone_2x1" && 4th_plate_bottom_hole != "outlet" && 4th_plate_bottom_hole != "toggle" && 4th_plate_bottom_hole != "rocker" && 4th_plate_bottom_hole != "keystone_1x3" && 4th_plate_bottom_hole != "keystone_2x3") {
	translate([height_sizes[plate_size]/2 - 1,l_offset[plate_size] - 22 + switch_offset * 3,6]) rotate([0,180,0])  keystone_matrix_generator(2);
	}
if (4th_plate_bottom_hole == "keystone_2x1" && 4th_plate == "none") {
	translate([height_sizes[plate_size]/2 + outer_length/2,l_offset[plate_size] - 22 + switch_offset * 3,6]) rotate([0,180,0]) keystone_matrix_generator(2);
	}
else if (4th_plate_bottom_hole == "keystone_2x1" && 4th_plate != "outlet" && 4th_plate != "toggle" && 4th_plate != "rocker" && 4th_plate != "keystone_1x3" && 4th_plate != "keystone_2x3") {
	translate([height_sizes[plate_size]/2 + outer_length + 1,l_offset[plate_size] - 22 + switch_offset * 3,6]) rotate([0,180,0]) keystone_matrix_generator(2);
	}
if (4th_plate == "keystone_1x3" && 4th_plate_bottom_hole != "outlet" && 4th_plate_bottom_hole != "toggle" && 4th_plate_bottom_hole != "rocker" && 4th_plate_bottom_hole != "keystone_2x3") {
	translate([height_sizes[plate_size]/2 +  75.5/2,l_offset[plate_size] - 22 + switch_offset * 3,6]) rotate([0,180,0]) keystone_matrix_generator(3);
	}
else if (4th_plate_bottom_hole == "keystone_1x3" && 4th_plate != "outlet" && 4th_plate != "toggle" && 4th_plate != "rocker" && 4th_plate != "keystone_2x3") {
	translate([height_sizes[plate_size]/2 +  75.5/2,l_offset[plate_size] - 22 + switch_offset * 3,6]) rotate([0,180,0]) keystone_matrix_generator(3);
	}
if (4th_plate == "keystone_2x3" && 4th_plate_bottom_hole != "outlet" && 4th_plate_bottom_hole != "toggle" && 4th_plate_bottom_hole != "rocker") {
	translate([height_sizes[plate_size]/2 +  75.5/2,l_offset[plate_size] - 22 + switch_offset * 3,6]) rotate([0,180,0]) keystone_matrix_generator(6);
	}
else if (4th_plate_bottom_hole == "keystone_2x3" && 4th_plate != "outlet" && 4th_plate != "toggle" && 4th_plate != "rocker") {
	translate([height_sizes[plate_size]/2 +  75.5/2,l_offset[plate_size] - 22 + switch_offset * 3,6]) rotate([0,180,0]) keystone_matrix_generator(6);
	}
}

module plate5_solid(){
if (5th_plate == "keystone_1x1" && 5th_plate_bottom_hole == "none") {
	translate([height_sizes[plate_size]/2 + outer_length/2,l_offset[plate_size] - 22 + switch_offset * 4,6]) rotate([0,180,0]) keystone_matrix_generator(1);
	}
else if (5th_plate == "keystone_1x1" && 5th_plate_bottom_hole != "outlet" && 5th_plate_bottom_hole != "toggle" && 5th_plate_bottom_hole != "rocker" && 5th_plate_bottom_hole != "keystone_1x3" && 5th_plate_bottom_hole != "keystone_2x3") {
	translate([height_sizes[plate_size]/2 - 1,l_offset[plate_size] - 22 + switch_offset * 4,6]) rotate([0,180,0])  keystone_matrix_generator(1);
	}
if (5th_plate_bottom_hole == "keystone_1x1" && 5th_plate == "none") {
	translate([height_sizes[plate_size]/2 + outer_length/2,l_offset[plate_size] - 22 + switch_offset * 4,6]) rotate([0,180,0]) keystone_matrix_generator(1);
	}
else if (5th_plate_bottom_hole == "keystone_1x1" && 5th_plate != "outlet" && 5th_plate != "toggle" && 5th_plate != "rocker" && 5th_plate != "keystone_1x3" && 5th_plate != "keystone_2x3") {
	translate([height_sizes[plate_size]/2 + outer_length + 1,l_offset[plate_size] - 22 + switch_offset * 4,6]) rotate([0,180,0]) keystone_matrix_generator(1);
	}
if (5th_plate == "keystone_2x1" && 5th_plate_bottom_hole == "none") {
	translate([height_sizes[plate_size]/2 + outer_length/2,l_offset[plate_size] - 22 + switch_offset * 4,6]) rotate([0,180,0]) keystone_matrix_generator(2);
	}
else if (5th_plate == "keystone_2x1" && 5th_plate_bottom_hole != "outlet" && 5th_plate_bottom_hole != "toggle" && 5th_plate_bottom_hole != "rocker" && 5th_plate_bottom_hole != "keystone_1x3" && 5th_plate_bottom_hole != "keystone_2x3") {
	translate([height_sizes[plate_size]/2 - 1,l_offset[plate_size] - 22 + switch_offset * 4,6]) rotate([0,180,0])  keystone_matrix_generator(2);
	}
if (5th_plate_bottom_hole == "keystone_2x1" && 5th_plate == "none") {
	translate([height_sizes[plate_size]/2 + outer_length/2,l_offset[plate_size] - 22 + switch_offset * 4,6]) rotate([0,180,0]) keystone_matrix_generator(2);
	}
else if (5th_plate_bottom_hole == "keystone_2x1" && 5th_plate != "outlet" && 5th_plate != "toggle" && 5th_plate != "rocker" && 5th_plate != "keystone_1x3" && 5th_plate != "keystone_2x3") {
	translate([height_sizes[plate_size]/2 + outer_length + 1,l_offset[plate_size] - 22 + switch_offset * 4,6]) rotate([0,180,0]) keystone_matrix_generator(2);
	}
if (5th_plate == "keystone_1x3" && 5th_plate_bottom_hole != "outlet" && 5th_plate_bottom_hole != "toggle" && 5th_plate_bottom_hole != "rocker" && 5th_plate_bottom_hole != "keystone_2x3") {
	translate([height_sizes[plate_size]/2 +  75.5/2,l_offset[plate_size] - 22 + switch_offset * 4,6]) rotate([0,180,0]) keystone_matrix_generator(3);
	}
else if (5th_plate_bottom_hole == "keystone_1x3" && 5th_plate != "outlet" && 5th_plate != "toggle" && 5th_plate != "rocker" && 5th_plate != "keystone_2x3") {
	translate([height_sizes[plate_size]/2 +  75.5/2,l_offset[plate_size] - 22 + switch_offset * 4,6]) rotate([0,180,0]) keystone_matrix_generator(3);
	}
if (5th_plate == "keystone_2x3" && 5th_plate_bottom_hole != "outlet" && 5th_plate_bottom_hole != "toggle" && 5th_plate_bottom_hole != "rocker") {
	translate([height_sizes[plate_size]/2 +  75.5/2,l_offset[plate_size] - 22 + switch_offset * 4,6]) rotate([0,180,0]) keystone_matrix_generator(6);
	}
else if (5th_plate_bottom_hole == "keystone_2x3" && 5th_plate != "outlet" && 5th_plate != "toggle" && 5th_plate != "rocker") {
	translate([height_sizes[plate_size]/2 +  75.5/2,l_offset[plate_size] - 22 + switch_offset * 4,6]) rotate([0,180,0]) keystone_matrix_generator(6);
	}
}

  ///////////////////
 // PlateStation: //
///////////////////

//Plate size and bevel
module plate() {
	difference() {
		cube([height_sizes[plate_size],solid_plate_width,6]);
		translate([-4.3,-5,6.2]) rotate([0,45,0]) cube([6,edgewidth,6]); //Top Bevel
		translate([height_sizes[plate_size]-4.2,-5,6.25]) rotate([0,45,0]) cube([6,edgewidth,6]); //Bottom Bevel
		translate([height_sizes[plate_size]+10,-4.4,6.1]) rotate([0,45,90]) cube([6,height_sizes[plate_size]+20,6]); //Left Bevel (doesn't change)
		translate([height_sizes[plate_size]+10,rightbevel,6]) rotate([0,45,90]) cube([6,height_sizes[plate_size]+10,6]); //Right Bevel (scales right)
				}
			}


// Thinning Plate
module plate_inner() {
	scale([0.95,thinner_offset[plate_width],1]){
	translate([3,3,0]){
	difference() {
		cube([height_sizes[plate_size],solid_plate_width,6]);
		translate([-4.3,-5,6.2]) rotate([0,45,0]) cube([6,edgewidth,6]); //Top Bevel
		translate([height_sizes[plate_size]-4.2,-5,6.25]) rotate([0,45,0]) cube([6,edgewidth,6]); //Bottom Bevel
		translate([height_sizes[plate_size]+10,-4.4,6.1]) rotate([0,45,90]) cube([6,height_sizes[plate_size]+20,6]); //Left Bevel (doesn't change)
		translate([height_sizes[plate_size]+10,rightbevel,6]) rotate([0,45,90]) cube([6,height_sizes[plate_size]+10,6]); //Right Bevel (scales right)
				}
			}
		}
	}

// Box screw holes
module box_screws(){
	 translate([height_sizes[plate_size]/2 + 41.67125,0,-1]) cylinder(r=2, h=10, $fn=12);
	 translate([height_sizes[plate_size]/2 + 41.67125,0,3.5]) cylinder(r1=2, r2=3.3, h=3);
	 translate([height_sizes[plate_size]/2 - 41.67125,0,-1]) cylinder(r=2, h=10, $fn=12);
	 translate([height_sizes[plate_size]/2 - 41.67125,0,3.5]) cylinder(r1=2, r2=3.3, h=3);
}

// Rocker/Designer screw holes
module rocker_screws(){
	 translate([height_sizes[plate_size]/2 + 48.41875,0,-1]) cylinder(r=2, h=10, $fn=12);
	 translate([height_sizes[plate_size]/2 + 48.41875,0,3.5]) cylinder(r1=2, r2=3.3, h=3);
	 translate([height_sizes[plate_size]/2 - 48.41875,0,-1]) cylinder(r=2, h=10, $fn=12);
	 translate([height_sizes[plate_size]/2 - 48.41875,0,3.5]) cylinder(r1=2, r2=3.3, h=3);
}

// Toggle screw holes
module toggle_screws(){
	 translate([height_sizes[plate_size]/2 + 30.1625,0,-1]) cylinder(r=2, h=10, $fn=12);
	 translate([height_sizes[plate_size]/2 + 30.1625,0,3.5]) cylinder(r1=2, r2=3.3, h=3);
	 translate([height_sizes[plate_size]/2 - 30.1625,0,-1]) cylinder(r=2, h=10, $fn=12);
	 translate([height_sizes[plate_size]/2 - 30.1625,0,3.5]) cylinder(r1=2, r2=3.3, h=3);
}

  ///////////////
 // Portland: //
///////////////

// Hole Cutout definitions
module hole(hole_type) {


// Toggle switch hole
	if (hole_type == "toggle") {
		translate([height_sizes[plate_size]/2,0,0]) cube([23.8125,10.3188,15], center = true);
		 						}

// Toggle switch hole and screw holes
	if (hole_type == "long_toggle") {
		translate([height_sizes[plate_size]/2,0,0]) cube([43.6563,11.9063,15], center = true);
		 						}

// Rocker switch plate
	if (hole_type == "rocker") {
		translate([height_sizes[plate_size]/2,0,0]) cube([67.1,33.3,15], center = true);

		 						}

// Duplex power outlet plate or dual side toggles
	if (hole_type == "outlet" || hole_type == "dualsidetoggle") {
		translate([height_sizes[plate_size]/2 + 19.3915,0,0]) {
			difference() {
				cylinder(r=17.4625, h=15, center = true);
				translate([-24.2875,-15,-2]) cube([10,37,15], center = false);
				translate([14.2875,-15,-2]) cube([10,37,15], center = false);
								}
							}
		translate([height_sizes[plate_size]/2 - 19.3915,0,0]){
			difference(){
				cylinder(r=17.4625, h=15, center = true);
				translate([-24.2875,-15,-2]) cube([10,37,15], center = false);
				translate([14.2875,-15,-2]) cube([10,37,15], center = false);
								}
							}
		translate([height_sizes[plate_size]/2,0,-1]) cylinder(r=2, h=10);
		translate([height_sizes[plate_size]/2,0,3.5]) cylinder(r1=2, r2=3.3, h=3);
							}

// Blank plate
	if (hole_type == "blank") { }

// VGA & DB09 plate
// VGA Fits http://www.datapro.net/products/vga-dual-panel-mount-f-f-cable.html
// DB09 Fits http://www.datapro.net/products/db9-serial-panel-mount-male-extension.html
	if (hole_type == "vga" || hole_type == "db09") {

			translate([0,-12.5,3]) cylinder(r=1.75, h=10, center = true);
			translate([0,12.5,3]) cylinder(r=1.75, h=10, center = true);
				difference(){
					cube([10,19,13], center=true);
					translate([-5,-9.2,1]) rotate([0,0,-35.6]) cube([4.4,2.4,15], center=true);
					translate([.9,-11.2,0]) rotate([0,0,9.6]) cube([10,4.8,15], center=true);
					translate([4.6,-8.5,0]) rotate([0,0,37.2]) cube([4.4,2.4,15], center=true);
					translate([-5,9.2,1]) rotate([0,0,35.6]) cube([4.4,2.4,15], center=true);
					translate([0.9,11.2,0]) rotate([0,0,-9.6]) cube([10,4.8,15], center=true);
					translate([4.6,8.5,0]) rotate([0,0,-37.2]) cube([4.4,2.4,15], center=true);
								}
						}

// HDMI plate
// Fits http://www.datapro.net/products/hdmi-panel-mount-extension-cable.html
	if (hole_type == "hdmi") {
		translate([0,-13,3]) cylinder(r=1.75, h=10, center = true);
		translate([0,13,3]) cylinder(r=1.75, h=10, center = true);
		translate([0,0,3]) cube([6,16,10], center=true);
							}

// DVI-I plate
// Fits http://www.datapro.net/products/dvi-i-panel-mount-extension-cable.html
	if (hole_type == "dvi") {
		translate([0,-16,3]) cylinder(r=1.75, h=10, center = true);
		translate([0,16,3]) cylinder(r=1.75, h=10, center = true);
		translate([0,0,3]) cube([10,26,10], center=true);
							}

// DisplayPort plate
// Fits http://www.datapro.net/products/dvi-i-panel-mount-extension-cable.html
	if (hole_type == "displayport") {
		translate([0,-13.5,3]) cylinder(r=1.75, h=10, center = true);
		translate([0,13.5,3]) cylinder(r=1.75, h=10, center = true);
		translate([0,0,0]){
			difference(){
				translate([0,0,3]) cube([7,19,10], center=true);
				translate([2.47,-9.37,3]) rotate([0,0,-54.6]) cube([3,5,14], center=true);
						}
								}
									}

// USB-A Plate
// Fits http://www.datapro.net/products/usb-panel-mount-type-a-cable.html
	if (hole_type == "usb-a") {
		translate([0,-15,3]) cylinder(r=1.75, h=10, center = true);
		translate([0,15,3]) cylinder(r=1.75, h=10, center = true);
		translate([0,0,3]) cube([8,16,10], center=true);
							}

// USB-B Plate
// Fits http://www.datapro.net/products/usb-panel-mount-type-b-cable.html
	if (hole_type == "usb-b") {
		translate([0,-13,3]) cylinder(r=1.75, h=10, center = true);
		translate([0,13,3]) cylinder(r=1.75, h=10, center = true);
		translate([0,0,3]) cube([11,12,10], center=true);
							}

// 1394 Firewire Plate
// Fits http://www.datapro.net/products/firewire-panel-mount-extension.html
	if (hole_type == "firewire") {
		translate([0,-13.5,3]) cylinder(r=1.75, h=10, center = true);
		translate([0,13.5,3]) cylinder(r=1.75, h=10, center = true);
		translate([0,0,3]) cube([7,12,10], center=true);
							}

// F-Type / Cable TV Plate
// Fits http://www.datapro.net/products/f-type-panel-mounting-coupler.html
	if (hole_type == "f-type") {
		translate([0,0,3]) cylinder(r=4.7625, h=10, center=true);
							}

// Cat5e & Gat6 plate
// Cat5e Fits http://www.datapro.net/products/cat-5e-panel-mount-ethernet.html
// Cat6 Fits hhttp://www.datapro.net/products/cat-6-panel-mount-ethernet.html
	if (hole_type == "cat5e" || hole_type == "cat6") {
		translate([0,-12.5,3]) cylinder(r=1.75, h=10, center = true);
		translate([0,12.5,3]) cylinder(r=1.75, h=10, center = true);
		translate([0,0,3]) cube([15,15,10], center=true);
		}

// S-Video & PS2 plate
// S-Video Fits hhttp://www.datapro.net/products/cat-6-panel-mount-ethernet.html
// PS2 http://www.datapro.net/products/ps2-panel-mount-extension-cable.html
	if (hole_type == "svideo" || hole_type == "ps2") {
		translate([0,-10,3]) cylinder(r=1.75, h=10, center = true);
		translate([0,10,3]) cylinder(r=1.75, h=10, center = true);
		translate([0,0,3]) cylinder(r=5, h=10, center=true);
		}


// Stereo / 1/4" headphone jack coupler
// Stereo coupler Fits http://www.datapro.net/products/stereo-panel-mount-coupler.html
	if (hole_type == "stereo") {
		translate([0,0,3]) cylinder(r=2.985, h=10, center=true);
		}

//Keystone cuts for solid insertions
//Keystone 1x1
    if (hole_type == "keystone_1x1") {
        translate([0,0,5]) cube([26.5,44,15], center = true);
    }  
//Keystone 2x1
    if (hole_type == "keystone_2x1") {
        translate([0,0,5]) cube([26.5,44,15], center = true);
    }   
//Keystone 1x3
    if (hole_type == "keystone_1x3") {
        translate([height_sizes[plate_size]/2,0,0]) cube([75.5,44,15], center = true);
    }   
//Keystone 2x3
    if (hole_type == "keystone_2x3") {
        translate([height_sizes[plate_size]/2,0,0]) cube([75.5,44,15], center = true);
    }
//End of module "hole"
}

  ////////////////////////////////
 //Keystone Solids Generation: //
////////////////////////////////

module clip_catch() {
  rotate([90, 0, 0]) {
    linear_extrude(height = outer_width) {
      polygon(points = [[0,0],
                        [catch_overhang,0],
                        [2 + catch_overhang,2],
                        [0,2]],
                      paths = [[0,1,2,3]]);
    }
  }
}

module keystone_generate() {
union() {

difference() {
  difference() {
    cube([outer_length, outer_width, wall_height]);
   translate([wall_thickness, wall_thickness, big_clip_clearance]) {
      cube([outer_length, jack_width, wall_height]);
    }
  }
  translate([wall_thickness + small_clip_depth, wall_thickness, 0]){
    cube([jack_length, jack_width, wall_height + 1]);
  }
}

cube([wall_thickness, outer_width, wall_height]);

cube([wall_thickness + small_clip_depth,
           outer_width, small_clip_clearance]);

translate([wall_thickness - 2, outer_width, wall_height - 2]) {
  clip_catch();
}

translate([outer_length - wall_thickness,0,0]) {
  cube([wall_thickness, outer_width, wall_height]);
}

translate([outer_length - (wall_thickness - 2), 0, wall_height - 2]) {
  rotate([0, 0, -180]) {
    clip_catch();
  }
}


}
}

module keystone_matrix_generator(jack_num) {
    if (jack_num == 1) {
        union() {
            translate([0,12.5,0])
                keystone_generate();
            translate([0,0,0])
                cube([26.5,12.5,3]);
            translate([0,31.5,0])
                cube([26.5,12.5,3]);
        }
    }
    else if (jack_num == 2) {
        union(){
            translate([0,0,0])
                keystone_generate();
            translate([0,25,0])
                keystone_generate();
            translate([0,19,0])
                cube([26.5,6,5]);
        }
    }
    else if (jack_num == 3 ) {
        union(){
            translate([0,12.5,0])
                keystone_generate();
            translate([24.5,12.5,0])
                keystone_generate();
            translate([49,12.5,0])
                keystone_generate();
            translate([0,0,0])
                cube([75.5,12.5,3]);
            translate([0,31.5,0])
                cube([75.5,12.5,3]);
        }
    }
    else if (jack_num == 6) {
        union(){
            translate([0,0,0])
                keystone_generate();
            translate([24.5,0,0])
                keystone_generate();
            translate([49,0,0])
                keystone_generate();
            translate([0,25,0])
                keystone_generate();
            translate([24.5,25,0])
                keystone_generate();
            translate([49,25,0])
                keystone_generate();
            translate([0,19,0])
                cube([75.5,6,5]);
        }
    }
}

  ////////////////////////
 // Number One ENGAGE: //
////////////////////////

// Rotate so it sits correctly on plate (whoops) and make upside down
rotate([0,180,90]){
// put plate at 0,0,0 for easier printing
translate([-height_sizes[plate_size]/2,-solid_plate_width/2,-6]){

if (plate_width == 1) {
	difference() {
		plate();
		translate([0,0,-3]) plate_inner();
		plate1();
			}
		union() {
		plate1_solid();
		}
			}

else if (plate_width == 2) {
difference()
{
plate();
translate([0,0,-3]) plate_inner();
plate1();
plate2();
}
union() {
		plate1_solid();
		plate2_solid();
		}
}

else if (plate_width == 3) {
difference()
{
plate();
translate([0,0,-3]) plate_inner();
plate1();
plate2();
plate3();
}
union() {
		plate1_solid();
		plate2_solid();
		plate3_solid();
		}
}

else if (plate_width == 4) {
difference()
{
plate();
translate([0,0,-3]) plate_inner();
plate1();
plate2();
plate3();
plate4();
}
union() {
		plate1_solid();
		plate2_solid();
		plate3_solid();
		plate4_solid();
		}
}

else if (plate_width == 5) {
difference()
{
plate();
translate([0,0,-3]) plate_inner();
plate1();
plate2();
plate3();
plate4();
plate5();
}
union() {
		plate1_solid();
		plate2_solid();
		plate3_solid();
		plate4_solid();
		plate5_solid();
		}
}

//End Rotate
}
//End Translate
}
